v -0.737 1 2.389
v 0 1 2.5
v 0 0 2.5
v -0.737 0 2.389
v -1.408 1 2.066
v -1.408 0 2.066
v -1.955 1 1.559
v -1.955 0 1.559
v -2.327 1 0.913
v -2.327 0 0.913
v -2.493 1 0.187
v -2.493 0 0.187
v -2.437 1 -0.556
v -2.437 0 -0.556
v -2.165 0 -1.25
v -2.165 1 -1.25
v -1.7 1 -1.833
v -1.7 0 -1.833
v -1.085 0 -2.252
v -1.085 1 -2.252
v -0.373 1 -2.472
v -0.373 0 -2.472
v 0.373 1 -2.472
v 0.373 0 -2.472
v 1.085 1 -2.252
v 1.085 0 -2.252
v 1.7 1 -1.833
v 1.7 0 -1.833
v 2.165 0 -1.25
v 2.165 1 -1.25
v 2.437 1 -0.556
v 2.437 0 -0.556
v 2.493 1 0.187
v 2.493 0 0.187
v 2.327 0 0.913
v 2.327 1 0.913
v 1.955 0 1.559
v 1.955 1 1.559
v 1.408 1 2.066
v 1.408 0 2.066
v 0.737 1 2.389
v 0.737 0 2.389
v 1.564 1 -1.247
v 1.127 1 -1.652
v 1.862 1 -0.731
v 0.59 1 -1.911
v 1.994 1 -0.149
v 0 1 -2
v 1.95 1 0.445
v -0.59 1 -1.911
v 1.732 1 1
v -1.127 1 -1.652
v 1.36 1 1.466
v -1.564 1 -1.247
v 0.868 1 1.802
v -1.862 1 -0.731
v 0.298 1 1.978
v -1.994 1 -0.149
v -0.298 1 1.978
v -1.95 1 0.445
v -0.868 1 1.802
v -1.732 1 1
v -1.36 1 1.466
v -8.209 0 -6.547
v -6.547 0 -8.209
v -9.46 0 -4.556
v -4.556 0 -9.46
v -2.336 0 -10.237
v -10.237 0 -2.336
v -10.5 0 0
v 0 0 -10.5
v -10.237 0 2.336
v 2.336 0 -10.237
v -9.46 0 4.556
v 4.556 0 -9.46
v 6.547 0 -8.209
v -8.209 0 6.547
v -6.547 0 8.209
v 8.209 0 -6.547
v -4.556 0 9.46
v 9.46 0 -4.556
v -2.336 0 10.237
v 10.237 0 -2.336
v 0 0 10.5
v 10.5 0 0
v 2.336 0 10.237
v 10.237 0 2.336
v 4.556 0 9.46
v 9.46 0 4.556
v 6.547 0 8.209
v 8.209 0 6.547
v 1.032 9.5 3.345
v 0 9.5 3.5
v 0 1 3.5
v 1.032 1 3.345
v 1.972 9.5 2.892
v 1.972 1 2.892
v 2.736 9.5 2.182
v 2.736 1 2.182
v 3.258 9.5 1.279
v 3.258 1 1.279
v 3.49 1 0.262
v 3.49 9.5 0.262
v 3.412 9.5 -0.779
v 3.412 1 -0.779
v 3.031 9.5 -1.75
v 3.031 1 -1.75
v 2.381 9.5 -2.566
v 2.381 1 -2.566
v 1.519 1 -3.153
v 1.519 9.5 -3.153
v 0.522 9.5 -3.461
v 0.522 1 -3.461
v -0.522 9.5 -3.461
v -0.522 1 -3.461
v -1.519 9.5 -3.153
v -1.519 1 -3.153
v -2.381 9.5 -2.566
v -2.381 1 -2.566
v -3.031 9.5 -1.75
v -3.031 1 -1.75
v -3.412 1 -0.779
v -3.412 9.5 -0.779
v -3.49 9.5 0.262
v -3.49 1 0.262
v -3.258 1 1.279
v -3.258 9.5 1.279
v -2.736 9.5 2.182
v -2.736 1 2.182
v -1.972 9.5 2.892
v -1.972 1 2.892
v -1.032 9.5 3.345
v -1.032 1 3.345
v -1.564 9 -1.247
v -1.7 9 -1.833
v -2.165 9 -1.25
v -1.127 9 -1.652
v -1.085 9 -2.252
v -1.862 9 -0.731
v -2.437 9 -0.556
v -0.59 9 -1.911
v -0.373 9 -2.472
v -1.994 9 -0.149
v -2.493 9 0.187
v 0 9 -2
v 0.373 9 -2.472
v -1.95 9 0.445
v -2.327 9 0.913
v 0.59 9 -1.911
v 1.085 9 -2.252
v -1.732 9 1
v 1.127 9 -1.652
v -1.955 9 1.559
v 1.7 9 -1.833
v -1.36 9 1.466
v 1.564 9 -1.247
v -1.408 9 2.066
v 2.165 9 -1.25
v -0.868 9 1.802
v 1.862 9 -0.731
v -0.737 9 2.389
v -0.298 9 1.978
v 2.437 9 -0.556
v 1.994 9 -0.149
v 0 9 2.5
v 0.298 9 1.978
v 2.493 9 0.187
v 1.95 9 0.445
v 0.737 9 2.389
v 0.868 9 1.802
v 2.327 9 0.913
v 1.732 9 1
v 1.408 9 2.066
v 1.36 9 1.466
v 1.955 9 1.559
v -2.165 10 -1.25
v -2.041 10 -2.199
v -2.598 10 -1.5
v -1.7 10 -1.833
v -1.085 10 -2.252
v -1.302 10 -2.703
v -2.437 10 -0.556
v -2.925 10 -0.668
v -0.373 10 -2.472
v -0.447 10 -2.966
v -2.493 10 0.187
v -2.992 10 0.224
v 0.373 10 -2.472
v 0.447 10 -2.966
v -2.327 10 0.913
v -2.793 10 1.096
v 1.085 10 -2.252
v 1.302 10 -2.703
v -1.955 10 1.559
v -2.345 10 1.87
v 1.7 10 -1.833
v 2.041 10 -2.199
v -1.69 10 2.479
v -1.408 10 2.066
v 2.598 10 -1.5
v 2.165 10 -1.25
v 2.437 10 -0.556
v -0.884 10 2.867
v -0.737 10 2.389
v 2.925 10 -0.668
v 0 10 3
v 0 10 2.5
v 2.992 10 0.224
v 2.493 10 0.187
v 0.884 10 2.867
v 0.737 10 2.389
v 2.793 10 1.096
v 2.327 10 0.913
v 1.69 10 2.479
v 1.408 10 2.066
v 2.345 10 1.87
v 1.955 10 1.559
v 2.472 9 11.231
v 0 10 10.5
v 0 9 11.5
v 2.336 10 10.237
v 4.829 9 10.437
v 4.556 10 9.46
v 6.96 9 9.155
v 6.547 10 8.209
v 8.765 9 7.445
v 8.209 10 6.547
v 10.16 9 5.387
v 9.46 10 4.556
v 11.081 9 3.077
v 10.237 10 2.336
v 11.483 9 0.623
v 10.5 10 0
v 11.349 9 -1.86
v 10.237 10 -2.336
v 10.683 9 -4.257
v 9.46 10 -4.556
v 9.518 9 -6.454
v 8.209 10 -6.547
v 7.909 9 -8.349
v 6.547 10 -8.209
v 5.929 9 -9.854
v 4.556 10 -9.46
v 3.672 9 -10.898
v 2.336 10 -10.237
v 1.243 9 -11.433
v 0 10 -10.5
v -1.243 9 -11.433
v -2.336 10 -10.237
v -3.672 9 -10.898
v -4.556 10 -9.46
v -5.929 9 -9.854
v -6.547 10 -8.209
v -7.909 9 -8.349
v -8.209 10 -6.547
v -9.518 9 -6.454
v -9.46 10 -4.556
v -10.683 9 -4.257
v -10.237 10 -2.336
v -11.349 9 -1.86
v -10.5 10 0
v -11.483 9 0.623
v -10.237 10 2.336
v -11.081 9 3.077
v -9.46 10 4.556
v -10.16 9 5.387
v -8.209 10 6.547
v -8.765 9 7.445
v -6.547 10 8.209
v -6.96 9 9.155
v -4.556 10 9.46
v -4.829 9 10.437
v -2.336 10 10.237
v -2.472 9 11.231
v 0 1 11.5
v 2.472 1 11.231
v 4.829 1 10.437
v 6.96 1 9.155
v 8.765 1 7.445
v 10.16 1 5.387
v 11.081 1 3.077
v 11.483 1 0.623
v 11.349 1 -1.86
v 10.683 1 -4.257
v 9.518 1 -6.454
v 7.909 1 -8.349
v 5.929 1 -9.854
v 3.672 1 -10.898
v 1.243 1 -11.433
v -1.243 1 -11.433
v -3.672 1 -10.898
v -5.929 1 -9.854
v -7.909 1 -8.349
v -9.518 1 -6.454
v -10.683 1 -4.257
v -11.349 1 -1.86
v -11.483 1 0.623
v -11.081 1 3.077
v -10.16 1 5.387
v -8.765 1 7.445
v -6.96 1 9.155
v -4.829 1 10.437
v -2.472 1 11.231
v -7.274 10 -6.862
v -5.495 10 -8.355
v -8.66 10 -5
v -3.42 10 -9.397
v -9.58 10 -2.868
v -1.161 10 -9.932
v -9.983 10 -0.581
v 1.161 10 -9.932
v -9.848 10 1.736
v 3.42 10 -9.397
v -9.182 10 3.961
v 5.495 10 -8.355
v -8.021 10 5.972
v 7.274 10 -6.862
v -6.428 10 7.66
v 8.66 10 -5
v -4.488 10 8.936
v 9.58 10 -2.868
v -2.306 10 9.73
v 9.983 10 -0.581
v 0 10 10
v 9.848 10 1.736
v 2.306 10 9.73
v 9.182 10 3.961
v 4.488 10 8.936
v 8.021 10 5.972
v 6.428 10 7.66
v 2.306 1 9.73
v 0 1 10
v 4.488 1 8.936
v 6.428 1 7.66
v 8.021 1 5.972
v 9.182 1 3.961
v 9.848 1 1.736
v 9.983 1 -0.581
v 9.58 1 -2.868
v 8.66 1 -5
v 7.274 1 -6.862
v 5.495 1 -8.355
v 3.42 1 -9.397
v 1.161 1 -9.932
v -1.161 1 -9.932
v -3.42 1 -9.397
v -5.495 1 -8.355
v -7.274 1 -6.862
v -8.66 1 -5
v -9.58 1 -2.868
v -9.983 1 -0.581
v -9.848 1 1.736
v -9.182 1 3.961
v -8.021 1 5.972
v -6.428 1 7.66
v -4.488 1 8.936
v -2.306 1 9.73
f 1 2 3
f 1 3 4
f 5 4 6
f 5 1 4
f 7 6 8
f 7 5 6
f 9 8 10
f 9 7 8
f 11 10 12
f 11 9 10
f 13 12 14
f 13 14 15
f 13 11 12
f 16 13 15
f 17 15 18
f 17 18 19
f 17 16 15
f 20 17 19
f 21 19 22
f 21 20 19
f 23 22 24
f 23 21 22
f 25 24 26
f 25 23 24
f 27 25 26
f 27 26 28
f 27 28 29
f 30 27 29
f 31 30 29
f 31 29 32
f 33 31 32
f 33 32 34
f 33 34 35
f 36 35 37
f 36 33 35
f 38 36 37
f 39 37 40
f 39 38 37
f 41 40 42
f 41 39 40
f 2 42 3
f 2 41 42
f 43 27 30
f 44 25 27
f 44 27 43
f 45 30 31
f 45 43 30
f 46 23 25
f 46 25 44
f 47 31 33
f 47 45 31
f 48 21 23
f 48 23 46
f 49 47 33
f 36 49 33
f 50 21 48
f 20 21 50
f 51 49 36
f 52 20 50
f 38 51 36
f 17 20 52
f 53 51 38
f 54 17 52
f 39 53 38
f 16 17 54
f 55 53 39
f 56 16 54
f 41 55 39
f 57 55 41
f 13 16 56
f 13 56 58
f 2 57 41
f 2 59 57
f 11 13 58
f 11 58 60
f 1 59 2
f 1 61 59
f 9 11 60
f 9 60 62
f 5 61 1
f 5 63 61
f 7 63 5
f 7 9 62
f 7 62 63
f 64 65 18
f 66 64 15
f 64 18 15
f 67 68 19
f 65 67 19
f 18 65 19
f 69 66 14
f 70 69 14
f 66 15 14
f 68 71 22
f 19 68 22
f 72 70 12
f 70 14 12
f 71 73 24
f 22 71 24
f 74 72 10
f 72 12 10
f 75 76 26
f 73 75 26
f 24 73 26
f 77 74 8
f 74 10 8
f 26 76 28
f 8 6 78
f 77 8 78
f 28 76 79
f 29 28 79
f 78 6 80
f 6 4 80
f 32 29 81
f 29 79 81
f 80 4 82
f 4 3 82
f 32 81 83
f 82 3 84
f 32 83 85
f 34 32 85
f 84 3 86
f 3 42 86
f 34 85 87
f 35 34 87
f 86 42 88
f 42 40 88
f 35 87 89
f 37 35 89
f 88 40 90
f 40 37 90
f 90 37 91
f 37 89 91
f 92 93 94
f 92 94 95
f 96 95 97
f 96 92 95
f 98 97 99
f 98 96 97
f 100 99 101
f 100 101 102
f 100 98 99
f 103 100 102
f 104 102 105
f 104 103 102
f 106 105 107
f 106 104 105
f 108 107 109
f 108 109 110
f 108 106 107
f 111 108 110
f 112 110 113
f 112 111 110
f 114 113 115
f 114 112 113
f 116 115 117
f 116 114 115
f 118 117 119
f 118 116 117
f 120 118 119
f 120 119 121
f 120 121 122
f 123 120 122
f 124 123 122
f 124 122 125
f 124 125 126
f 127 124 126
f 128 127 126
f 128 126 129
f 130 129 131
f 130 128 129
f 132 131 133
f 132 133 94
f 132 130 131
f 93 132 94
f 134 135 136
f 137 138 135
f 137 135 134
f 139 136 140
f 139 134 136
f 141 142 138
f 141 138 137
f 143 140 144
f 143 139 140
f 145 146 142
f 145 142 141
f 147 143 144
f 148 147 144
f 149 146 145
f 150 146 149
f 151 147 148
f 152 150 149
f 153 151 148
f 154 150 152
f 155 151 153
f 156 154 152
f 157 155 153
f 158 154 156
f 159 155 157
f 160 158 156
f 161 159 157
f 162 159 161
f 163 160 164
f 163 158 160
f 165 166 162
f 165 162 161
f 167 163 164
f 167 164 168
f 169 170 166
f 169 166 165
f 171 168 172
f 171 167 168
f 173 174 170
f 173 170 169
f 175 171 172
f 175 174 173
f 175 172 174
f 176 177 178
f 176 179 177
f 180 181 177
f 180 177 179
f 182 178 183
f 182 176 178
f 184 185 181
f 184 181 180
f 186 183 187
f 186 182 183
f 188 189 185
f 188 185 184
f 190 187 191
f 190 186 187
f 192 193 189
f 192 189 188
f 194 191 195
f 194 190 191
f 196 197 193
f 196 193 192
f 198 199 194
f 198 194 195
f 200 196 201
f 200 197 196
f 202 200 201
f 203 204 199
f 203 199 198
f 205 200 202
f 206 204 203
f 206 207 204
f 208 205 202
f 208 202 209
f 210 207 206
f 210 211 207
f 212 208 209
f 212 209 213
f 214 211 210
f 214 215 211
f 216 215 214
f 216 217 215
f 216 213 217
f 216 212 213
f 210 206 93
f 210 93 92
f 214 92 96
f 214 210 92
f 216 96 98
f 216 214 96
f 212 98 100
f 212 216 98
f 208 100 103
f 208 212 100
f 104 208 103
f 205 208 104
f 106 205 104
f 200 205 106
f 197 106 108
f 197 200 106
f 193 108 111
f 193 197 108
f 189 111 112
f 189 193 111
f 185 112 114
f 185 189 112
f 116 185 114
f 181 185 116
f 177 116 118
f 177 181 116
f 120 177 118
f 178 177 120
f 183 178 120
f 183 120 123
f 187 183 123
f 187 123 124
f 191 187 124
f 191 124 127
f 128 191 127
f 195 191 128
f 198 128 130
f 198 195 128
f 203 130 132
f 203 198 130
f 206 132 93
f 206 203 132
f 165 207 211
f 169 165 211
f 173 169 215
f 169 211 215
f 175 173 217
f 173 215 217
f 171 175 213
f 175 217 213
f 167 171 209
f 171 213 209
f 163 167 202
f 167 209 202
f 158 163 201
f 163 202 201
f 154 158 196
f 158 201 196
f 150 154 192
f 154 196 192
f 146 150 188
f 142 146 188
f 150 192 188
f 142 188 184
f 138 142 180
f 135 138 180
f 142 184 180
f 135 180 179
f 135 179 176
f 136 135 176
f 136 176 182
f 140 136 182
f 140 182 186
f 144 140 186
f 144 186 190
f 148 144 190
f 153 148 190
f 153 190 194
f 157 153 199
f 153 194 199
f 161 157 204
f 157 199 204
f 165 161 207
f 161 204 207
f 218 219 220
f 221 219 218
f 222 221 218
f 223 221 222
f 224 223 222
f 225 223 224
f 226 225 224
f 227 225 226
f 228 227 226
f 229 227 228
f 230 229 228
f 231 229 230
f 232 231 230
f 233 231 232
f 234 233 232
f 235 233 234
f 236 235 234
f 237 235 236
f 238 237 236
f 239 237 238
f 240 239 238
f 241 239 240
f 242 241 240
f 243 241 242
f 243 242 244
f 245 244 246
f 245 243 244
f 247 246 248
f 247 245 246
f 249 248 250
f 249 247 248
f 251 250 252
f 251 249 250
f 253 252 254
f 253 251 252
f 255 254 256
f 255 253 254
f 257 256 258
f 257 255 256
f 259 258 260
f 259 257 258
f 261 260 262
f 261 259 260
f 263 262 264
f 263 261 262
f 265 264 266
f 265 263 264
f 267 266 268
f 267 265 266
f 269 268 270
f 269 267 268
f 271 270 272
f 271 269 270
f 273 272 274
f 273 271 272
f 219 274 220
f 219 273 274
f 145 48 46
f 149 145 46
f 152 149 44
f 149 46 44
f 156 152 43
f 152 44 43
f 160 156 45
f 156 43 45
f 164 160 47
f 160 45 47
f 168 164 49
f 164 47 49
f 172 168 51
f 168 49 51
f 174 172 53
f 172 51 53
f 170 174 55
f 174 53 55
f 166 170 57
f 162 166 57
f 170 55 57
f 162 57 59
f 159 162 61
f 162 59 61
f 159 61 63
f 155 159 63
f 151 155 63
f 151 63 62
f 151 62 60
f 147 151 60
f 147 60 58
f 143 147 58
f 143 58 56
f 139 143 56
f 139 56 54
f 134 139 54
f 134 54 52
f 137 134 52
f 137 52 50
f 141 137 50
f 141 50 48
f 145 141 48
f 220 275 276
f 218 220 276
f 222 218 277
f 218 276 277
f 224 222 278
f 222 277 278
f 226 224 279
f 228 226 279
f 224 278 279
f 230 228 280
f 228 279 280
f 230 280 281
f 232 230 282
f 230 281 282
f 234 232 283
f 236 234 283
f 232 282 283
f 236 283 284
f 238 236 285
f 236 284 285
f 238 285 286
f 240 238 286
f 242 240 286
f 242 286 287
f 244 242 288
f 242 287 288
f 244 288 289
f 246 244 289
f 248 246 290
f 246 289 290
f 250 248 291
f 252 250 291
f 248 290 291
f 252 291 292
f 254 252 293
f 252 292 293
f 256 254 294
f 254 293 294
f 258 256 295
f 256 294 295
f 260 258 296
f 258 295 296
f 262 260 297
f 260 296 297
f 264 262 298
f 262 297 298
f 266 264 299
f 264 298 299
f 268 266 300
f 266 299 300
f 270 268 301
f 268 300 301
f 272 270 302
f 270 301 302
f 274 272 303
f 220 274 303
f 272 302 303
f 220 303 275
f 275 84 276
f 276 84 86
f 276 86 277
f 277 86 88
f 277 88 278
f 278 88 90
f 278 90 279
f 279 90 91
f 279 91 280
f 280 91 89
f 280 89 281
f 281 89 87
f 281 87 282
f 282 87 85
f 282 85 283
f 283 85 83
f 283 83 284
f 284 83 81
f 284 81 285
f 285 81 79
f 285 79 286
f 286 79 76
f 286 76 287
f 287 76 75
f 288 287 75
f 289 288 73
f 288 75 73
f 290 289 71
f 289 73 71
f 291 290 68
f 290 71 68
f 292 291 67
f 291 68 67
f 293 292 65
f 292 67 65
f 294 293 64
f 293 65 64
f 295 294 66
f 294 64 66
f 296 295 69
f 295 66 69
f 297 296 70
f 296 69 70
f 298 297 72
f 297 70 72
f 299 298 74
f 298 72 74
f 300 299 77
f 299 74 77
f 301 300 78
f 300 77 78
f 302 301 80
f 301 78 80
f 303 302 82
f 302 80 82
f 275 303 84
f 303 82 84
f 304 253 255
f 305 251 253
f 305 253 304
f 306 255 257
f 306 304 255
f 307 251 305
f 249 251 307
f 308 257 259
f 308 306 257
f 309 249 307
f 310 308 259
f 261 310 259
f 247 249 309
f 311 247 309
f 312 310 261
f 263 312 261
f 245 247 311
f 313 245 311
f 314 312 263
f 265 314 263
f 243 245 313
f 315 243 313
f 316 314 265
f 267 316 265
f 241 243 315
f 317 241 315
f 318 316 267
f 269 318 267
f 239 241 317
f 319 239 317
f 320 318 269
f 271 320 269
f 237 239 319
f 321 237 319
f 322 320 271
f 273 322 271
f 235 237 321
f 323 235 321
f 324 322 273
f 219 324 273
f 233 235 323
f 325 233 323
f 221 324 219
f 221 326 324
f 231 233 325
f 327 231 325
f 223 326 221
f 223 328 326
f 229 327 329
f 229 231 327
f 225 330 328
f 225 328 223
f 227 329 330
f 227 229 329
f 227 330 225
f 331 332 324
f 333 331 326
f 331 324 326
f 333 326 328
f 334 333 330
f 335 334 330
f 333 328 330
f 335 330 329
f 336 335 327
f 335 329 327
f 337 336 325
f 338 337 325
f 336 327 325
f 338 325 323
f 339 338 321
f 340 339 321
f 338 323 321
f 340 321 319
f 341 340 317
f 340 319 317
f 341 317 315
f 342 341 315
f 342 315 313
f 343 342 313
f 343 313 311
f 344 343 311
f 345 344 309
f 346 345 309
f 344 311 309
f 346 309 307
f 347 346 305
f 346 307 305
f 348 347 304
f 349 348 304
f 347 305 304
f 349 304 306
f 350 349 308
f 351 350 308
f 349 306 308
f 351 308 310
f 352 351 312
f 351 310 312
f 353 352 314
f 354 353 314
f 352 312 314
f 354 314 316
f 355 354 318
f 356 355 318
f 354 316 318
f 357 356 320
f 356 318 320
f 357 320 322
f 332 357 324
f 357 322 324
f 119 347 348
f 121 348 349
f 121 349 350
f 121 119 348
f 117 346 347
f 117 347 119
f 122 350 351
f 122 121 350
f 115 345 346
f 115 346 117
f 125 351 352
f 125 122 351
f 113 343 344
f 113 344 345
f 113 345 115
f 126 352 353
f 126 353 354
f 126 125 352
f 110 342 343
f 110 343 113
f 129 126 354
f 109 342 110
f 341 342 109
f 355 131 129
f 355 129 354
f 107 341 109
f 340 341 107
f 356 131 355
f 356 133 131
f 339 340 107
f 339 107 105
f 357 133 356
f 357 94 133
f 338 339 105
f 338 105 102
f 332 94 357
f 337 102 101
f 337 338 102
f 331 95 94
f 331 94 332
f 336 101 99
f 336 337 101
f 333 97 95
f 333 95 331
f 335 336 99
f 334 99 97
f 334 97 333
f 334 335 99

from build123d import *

# Parameters (mm, degrees)
SKETCH_1_R          = 11.5
EXTRUDE_1_DEPTH     = 10
SKETCH_2_R          = 10
SKETCH_2_R_2        = 3.5
CUT_EXTRUDE_1_DEPTH = 9
SKETCH_3_R          = 2.5
CUT_EXTRUDE_2_DEPTH = 1
CUT_EXTRUDE_START   = -1
SKETCH_4_R          = 2.5
CUT_EXTRUDE_3_DEPTH = 1
SKETCH_5_R          = 2
CUT_EXTRUDE_4_DEPTH = 19.587630295
CHAMFER_1_SIZE      = 1
CHAMFER_2_SIZE      = 0.5


with BuildPart() as part:
    # 草图1 → 凸台-拉伸1 (new body)
    with BuildSketch(Plane(origin=(0, 0, 0), x_dir=(1, 0, 0), z_dir=(0, 1, 0))):
        with Locations(Location((0, 0, 0), (0, 0, 270))):
            Circle(SKETCH_1_R)
    extrude(amount=EXTRUDE_1_DEPTH)

    # 草图2 → 切除-拉伸1 (cut)
    with BuildSketch(Plane(origin=(0, 10, 0), x_dir=(1, 0, 0), z_dir=(0, 1, 0))):
        with Locations(Location((0, 0, 0), (0, 0, 270))):
            Circle(SKETCH_2_R)
        with Locations(Location((0, 0, 0), (0, 0, 270))):
            Circle(SKETCH_2_R_2, mode=Mode.SUBTRACT)
    extrude(amount=-CUT_EXTRUDE_1_DEPTH, mode=Mode.SUBTRACT)

    # 草图3 → 切除-拉伸2 (cut)
    with BuildSketch(Plane(origin=(0, 10, 0), x_dir=(1, 0, 0), z_dir=(0, 1, 0))):
        with Locations(Location((0, 0, 0), (0, 0, 270))):
            Circle(SKETCH_3_R)
    extrude(amount=-CUT_EXTRUDE_2_DEPTH, mode=Mode.SUBTRACT)

    # 草图4 → 切除-拉伸3 (cut)
    with BuildSketch(Plane.XZ.offset(CUT_EXTRUDE_START)):
        with Locations(Location((0, 0, 0), (0, 0, 90))):
            Circle(SKETCH_4_R)
    extrude(amount=CUT_EXTRUDE_3_DEPTH, mode=Mode.SUBTRACT)

    # 草图5 → 切除-拉伸4 (cut, through all)
    with BuildSketch(Plane.XZ.offset(-1)):
        with Locations(Location((0, 0, 0), (0, 0, 270))):
            Circle(SKETCH_5_R)
    extrude(amount=-CUT_EXTRUDE_4_DEPTH, mode=Mode.SUBTRACT)

    # 倒角1
    chamfer_1_edges = [part.edges().sort_by_distance(p)[0] for p in [
        (0, 0, -11.5),
        (0, 10, -11.5),
    ]]
    chamfer(chamfer_1_edges, length=CHAMFER_1_SIZE)

    # 倒角2
    chamfer_2_edges = [part.edges().sort_by_distance(p)[0] for p in [
        (0, 10, -3.5),
    ]]
    chamfer(chamfer_2_edges, length=CHAMFER_2_SIZE)


solid = part.part
